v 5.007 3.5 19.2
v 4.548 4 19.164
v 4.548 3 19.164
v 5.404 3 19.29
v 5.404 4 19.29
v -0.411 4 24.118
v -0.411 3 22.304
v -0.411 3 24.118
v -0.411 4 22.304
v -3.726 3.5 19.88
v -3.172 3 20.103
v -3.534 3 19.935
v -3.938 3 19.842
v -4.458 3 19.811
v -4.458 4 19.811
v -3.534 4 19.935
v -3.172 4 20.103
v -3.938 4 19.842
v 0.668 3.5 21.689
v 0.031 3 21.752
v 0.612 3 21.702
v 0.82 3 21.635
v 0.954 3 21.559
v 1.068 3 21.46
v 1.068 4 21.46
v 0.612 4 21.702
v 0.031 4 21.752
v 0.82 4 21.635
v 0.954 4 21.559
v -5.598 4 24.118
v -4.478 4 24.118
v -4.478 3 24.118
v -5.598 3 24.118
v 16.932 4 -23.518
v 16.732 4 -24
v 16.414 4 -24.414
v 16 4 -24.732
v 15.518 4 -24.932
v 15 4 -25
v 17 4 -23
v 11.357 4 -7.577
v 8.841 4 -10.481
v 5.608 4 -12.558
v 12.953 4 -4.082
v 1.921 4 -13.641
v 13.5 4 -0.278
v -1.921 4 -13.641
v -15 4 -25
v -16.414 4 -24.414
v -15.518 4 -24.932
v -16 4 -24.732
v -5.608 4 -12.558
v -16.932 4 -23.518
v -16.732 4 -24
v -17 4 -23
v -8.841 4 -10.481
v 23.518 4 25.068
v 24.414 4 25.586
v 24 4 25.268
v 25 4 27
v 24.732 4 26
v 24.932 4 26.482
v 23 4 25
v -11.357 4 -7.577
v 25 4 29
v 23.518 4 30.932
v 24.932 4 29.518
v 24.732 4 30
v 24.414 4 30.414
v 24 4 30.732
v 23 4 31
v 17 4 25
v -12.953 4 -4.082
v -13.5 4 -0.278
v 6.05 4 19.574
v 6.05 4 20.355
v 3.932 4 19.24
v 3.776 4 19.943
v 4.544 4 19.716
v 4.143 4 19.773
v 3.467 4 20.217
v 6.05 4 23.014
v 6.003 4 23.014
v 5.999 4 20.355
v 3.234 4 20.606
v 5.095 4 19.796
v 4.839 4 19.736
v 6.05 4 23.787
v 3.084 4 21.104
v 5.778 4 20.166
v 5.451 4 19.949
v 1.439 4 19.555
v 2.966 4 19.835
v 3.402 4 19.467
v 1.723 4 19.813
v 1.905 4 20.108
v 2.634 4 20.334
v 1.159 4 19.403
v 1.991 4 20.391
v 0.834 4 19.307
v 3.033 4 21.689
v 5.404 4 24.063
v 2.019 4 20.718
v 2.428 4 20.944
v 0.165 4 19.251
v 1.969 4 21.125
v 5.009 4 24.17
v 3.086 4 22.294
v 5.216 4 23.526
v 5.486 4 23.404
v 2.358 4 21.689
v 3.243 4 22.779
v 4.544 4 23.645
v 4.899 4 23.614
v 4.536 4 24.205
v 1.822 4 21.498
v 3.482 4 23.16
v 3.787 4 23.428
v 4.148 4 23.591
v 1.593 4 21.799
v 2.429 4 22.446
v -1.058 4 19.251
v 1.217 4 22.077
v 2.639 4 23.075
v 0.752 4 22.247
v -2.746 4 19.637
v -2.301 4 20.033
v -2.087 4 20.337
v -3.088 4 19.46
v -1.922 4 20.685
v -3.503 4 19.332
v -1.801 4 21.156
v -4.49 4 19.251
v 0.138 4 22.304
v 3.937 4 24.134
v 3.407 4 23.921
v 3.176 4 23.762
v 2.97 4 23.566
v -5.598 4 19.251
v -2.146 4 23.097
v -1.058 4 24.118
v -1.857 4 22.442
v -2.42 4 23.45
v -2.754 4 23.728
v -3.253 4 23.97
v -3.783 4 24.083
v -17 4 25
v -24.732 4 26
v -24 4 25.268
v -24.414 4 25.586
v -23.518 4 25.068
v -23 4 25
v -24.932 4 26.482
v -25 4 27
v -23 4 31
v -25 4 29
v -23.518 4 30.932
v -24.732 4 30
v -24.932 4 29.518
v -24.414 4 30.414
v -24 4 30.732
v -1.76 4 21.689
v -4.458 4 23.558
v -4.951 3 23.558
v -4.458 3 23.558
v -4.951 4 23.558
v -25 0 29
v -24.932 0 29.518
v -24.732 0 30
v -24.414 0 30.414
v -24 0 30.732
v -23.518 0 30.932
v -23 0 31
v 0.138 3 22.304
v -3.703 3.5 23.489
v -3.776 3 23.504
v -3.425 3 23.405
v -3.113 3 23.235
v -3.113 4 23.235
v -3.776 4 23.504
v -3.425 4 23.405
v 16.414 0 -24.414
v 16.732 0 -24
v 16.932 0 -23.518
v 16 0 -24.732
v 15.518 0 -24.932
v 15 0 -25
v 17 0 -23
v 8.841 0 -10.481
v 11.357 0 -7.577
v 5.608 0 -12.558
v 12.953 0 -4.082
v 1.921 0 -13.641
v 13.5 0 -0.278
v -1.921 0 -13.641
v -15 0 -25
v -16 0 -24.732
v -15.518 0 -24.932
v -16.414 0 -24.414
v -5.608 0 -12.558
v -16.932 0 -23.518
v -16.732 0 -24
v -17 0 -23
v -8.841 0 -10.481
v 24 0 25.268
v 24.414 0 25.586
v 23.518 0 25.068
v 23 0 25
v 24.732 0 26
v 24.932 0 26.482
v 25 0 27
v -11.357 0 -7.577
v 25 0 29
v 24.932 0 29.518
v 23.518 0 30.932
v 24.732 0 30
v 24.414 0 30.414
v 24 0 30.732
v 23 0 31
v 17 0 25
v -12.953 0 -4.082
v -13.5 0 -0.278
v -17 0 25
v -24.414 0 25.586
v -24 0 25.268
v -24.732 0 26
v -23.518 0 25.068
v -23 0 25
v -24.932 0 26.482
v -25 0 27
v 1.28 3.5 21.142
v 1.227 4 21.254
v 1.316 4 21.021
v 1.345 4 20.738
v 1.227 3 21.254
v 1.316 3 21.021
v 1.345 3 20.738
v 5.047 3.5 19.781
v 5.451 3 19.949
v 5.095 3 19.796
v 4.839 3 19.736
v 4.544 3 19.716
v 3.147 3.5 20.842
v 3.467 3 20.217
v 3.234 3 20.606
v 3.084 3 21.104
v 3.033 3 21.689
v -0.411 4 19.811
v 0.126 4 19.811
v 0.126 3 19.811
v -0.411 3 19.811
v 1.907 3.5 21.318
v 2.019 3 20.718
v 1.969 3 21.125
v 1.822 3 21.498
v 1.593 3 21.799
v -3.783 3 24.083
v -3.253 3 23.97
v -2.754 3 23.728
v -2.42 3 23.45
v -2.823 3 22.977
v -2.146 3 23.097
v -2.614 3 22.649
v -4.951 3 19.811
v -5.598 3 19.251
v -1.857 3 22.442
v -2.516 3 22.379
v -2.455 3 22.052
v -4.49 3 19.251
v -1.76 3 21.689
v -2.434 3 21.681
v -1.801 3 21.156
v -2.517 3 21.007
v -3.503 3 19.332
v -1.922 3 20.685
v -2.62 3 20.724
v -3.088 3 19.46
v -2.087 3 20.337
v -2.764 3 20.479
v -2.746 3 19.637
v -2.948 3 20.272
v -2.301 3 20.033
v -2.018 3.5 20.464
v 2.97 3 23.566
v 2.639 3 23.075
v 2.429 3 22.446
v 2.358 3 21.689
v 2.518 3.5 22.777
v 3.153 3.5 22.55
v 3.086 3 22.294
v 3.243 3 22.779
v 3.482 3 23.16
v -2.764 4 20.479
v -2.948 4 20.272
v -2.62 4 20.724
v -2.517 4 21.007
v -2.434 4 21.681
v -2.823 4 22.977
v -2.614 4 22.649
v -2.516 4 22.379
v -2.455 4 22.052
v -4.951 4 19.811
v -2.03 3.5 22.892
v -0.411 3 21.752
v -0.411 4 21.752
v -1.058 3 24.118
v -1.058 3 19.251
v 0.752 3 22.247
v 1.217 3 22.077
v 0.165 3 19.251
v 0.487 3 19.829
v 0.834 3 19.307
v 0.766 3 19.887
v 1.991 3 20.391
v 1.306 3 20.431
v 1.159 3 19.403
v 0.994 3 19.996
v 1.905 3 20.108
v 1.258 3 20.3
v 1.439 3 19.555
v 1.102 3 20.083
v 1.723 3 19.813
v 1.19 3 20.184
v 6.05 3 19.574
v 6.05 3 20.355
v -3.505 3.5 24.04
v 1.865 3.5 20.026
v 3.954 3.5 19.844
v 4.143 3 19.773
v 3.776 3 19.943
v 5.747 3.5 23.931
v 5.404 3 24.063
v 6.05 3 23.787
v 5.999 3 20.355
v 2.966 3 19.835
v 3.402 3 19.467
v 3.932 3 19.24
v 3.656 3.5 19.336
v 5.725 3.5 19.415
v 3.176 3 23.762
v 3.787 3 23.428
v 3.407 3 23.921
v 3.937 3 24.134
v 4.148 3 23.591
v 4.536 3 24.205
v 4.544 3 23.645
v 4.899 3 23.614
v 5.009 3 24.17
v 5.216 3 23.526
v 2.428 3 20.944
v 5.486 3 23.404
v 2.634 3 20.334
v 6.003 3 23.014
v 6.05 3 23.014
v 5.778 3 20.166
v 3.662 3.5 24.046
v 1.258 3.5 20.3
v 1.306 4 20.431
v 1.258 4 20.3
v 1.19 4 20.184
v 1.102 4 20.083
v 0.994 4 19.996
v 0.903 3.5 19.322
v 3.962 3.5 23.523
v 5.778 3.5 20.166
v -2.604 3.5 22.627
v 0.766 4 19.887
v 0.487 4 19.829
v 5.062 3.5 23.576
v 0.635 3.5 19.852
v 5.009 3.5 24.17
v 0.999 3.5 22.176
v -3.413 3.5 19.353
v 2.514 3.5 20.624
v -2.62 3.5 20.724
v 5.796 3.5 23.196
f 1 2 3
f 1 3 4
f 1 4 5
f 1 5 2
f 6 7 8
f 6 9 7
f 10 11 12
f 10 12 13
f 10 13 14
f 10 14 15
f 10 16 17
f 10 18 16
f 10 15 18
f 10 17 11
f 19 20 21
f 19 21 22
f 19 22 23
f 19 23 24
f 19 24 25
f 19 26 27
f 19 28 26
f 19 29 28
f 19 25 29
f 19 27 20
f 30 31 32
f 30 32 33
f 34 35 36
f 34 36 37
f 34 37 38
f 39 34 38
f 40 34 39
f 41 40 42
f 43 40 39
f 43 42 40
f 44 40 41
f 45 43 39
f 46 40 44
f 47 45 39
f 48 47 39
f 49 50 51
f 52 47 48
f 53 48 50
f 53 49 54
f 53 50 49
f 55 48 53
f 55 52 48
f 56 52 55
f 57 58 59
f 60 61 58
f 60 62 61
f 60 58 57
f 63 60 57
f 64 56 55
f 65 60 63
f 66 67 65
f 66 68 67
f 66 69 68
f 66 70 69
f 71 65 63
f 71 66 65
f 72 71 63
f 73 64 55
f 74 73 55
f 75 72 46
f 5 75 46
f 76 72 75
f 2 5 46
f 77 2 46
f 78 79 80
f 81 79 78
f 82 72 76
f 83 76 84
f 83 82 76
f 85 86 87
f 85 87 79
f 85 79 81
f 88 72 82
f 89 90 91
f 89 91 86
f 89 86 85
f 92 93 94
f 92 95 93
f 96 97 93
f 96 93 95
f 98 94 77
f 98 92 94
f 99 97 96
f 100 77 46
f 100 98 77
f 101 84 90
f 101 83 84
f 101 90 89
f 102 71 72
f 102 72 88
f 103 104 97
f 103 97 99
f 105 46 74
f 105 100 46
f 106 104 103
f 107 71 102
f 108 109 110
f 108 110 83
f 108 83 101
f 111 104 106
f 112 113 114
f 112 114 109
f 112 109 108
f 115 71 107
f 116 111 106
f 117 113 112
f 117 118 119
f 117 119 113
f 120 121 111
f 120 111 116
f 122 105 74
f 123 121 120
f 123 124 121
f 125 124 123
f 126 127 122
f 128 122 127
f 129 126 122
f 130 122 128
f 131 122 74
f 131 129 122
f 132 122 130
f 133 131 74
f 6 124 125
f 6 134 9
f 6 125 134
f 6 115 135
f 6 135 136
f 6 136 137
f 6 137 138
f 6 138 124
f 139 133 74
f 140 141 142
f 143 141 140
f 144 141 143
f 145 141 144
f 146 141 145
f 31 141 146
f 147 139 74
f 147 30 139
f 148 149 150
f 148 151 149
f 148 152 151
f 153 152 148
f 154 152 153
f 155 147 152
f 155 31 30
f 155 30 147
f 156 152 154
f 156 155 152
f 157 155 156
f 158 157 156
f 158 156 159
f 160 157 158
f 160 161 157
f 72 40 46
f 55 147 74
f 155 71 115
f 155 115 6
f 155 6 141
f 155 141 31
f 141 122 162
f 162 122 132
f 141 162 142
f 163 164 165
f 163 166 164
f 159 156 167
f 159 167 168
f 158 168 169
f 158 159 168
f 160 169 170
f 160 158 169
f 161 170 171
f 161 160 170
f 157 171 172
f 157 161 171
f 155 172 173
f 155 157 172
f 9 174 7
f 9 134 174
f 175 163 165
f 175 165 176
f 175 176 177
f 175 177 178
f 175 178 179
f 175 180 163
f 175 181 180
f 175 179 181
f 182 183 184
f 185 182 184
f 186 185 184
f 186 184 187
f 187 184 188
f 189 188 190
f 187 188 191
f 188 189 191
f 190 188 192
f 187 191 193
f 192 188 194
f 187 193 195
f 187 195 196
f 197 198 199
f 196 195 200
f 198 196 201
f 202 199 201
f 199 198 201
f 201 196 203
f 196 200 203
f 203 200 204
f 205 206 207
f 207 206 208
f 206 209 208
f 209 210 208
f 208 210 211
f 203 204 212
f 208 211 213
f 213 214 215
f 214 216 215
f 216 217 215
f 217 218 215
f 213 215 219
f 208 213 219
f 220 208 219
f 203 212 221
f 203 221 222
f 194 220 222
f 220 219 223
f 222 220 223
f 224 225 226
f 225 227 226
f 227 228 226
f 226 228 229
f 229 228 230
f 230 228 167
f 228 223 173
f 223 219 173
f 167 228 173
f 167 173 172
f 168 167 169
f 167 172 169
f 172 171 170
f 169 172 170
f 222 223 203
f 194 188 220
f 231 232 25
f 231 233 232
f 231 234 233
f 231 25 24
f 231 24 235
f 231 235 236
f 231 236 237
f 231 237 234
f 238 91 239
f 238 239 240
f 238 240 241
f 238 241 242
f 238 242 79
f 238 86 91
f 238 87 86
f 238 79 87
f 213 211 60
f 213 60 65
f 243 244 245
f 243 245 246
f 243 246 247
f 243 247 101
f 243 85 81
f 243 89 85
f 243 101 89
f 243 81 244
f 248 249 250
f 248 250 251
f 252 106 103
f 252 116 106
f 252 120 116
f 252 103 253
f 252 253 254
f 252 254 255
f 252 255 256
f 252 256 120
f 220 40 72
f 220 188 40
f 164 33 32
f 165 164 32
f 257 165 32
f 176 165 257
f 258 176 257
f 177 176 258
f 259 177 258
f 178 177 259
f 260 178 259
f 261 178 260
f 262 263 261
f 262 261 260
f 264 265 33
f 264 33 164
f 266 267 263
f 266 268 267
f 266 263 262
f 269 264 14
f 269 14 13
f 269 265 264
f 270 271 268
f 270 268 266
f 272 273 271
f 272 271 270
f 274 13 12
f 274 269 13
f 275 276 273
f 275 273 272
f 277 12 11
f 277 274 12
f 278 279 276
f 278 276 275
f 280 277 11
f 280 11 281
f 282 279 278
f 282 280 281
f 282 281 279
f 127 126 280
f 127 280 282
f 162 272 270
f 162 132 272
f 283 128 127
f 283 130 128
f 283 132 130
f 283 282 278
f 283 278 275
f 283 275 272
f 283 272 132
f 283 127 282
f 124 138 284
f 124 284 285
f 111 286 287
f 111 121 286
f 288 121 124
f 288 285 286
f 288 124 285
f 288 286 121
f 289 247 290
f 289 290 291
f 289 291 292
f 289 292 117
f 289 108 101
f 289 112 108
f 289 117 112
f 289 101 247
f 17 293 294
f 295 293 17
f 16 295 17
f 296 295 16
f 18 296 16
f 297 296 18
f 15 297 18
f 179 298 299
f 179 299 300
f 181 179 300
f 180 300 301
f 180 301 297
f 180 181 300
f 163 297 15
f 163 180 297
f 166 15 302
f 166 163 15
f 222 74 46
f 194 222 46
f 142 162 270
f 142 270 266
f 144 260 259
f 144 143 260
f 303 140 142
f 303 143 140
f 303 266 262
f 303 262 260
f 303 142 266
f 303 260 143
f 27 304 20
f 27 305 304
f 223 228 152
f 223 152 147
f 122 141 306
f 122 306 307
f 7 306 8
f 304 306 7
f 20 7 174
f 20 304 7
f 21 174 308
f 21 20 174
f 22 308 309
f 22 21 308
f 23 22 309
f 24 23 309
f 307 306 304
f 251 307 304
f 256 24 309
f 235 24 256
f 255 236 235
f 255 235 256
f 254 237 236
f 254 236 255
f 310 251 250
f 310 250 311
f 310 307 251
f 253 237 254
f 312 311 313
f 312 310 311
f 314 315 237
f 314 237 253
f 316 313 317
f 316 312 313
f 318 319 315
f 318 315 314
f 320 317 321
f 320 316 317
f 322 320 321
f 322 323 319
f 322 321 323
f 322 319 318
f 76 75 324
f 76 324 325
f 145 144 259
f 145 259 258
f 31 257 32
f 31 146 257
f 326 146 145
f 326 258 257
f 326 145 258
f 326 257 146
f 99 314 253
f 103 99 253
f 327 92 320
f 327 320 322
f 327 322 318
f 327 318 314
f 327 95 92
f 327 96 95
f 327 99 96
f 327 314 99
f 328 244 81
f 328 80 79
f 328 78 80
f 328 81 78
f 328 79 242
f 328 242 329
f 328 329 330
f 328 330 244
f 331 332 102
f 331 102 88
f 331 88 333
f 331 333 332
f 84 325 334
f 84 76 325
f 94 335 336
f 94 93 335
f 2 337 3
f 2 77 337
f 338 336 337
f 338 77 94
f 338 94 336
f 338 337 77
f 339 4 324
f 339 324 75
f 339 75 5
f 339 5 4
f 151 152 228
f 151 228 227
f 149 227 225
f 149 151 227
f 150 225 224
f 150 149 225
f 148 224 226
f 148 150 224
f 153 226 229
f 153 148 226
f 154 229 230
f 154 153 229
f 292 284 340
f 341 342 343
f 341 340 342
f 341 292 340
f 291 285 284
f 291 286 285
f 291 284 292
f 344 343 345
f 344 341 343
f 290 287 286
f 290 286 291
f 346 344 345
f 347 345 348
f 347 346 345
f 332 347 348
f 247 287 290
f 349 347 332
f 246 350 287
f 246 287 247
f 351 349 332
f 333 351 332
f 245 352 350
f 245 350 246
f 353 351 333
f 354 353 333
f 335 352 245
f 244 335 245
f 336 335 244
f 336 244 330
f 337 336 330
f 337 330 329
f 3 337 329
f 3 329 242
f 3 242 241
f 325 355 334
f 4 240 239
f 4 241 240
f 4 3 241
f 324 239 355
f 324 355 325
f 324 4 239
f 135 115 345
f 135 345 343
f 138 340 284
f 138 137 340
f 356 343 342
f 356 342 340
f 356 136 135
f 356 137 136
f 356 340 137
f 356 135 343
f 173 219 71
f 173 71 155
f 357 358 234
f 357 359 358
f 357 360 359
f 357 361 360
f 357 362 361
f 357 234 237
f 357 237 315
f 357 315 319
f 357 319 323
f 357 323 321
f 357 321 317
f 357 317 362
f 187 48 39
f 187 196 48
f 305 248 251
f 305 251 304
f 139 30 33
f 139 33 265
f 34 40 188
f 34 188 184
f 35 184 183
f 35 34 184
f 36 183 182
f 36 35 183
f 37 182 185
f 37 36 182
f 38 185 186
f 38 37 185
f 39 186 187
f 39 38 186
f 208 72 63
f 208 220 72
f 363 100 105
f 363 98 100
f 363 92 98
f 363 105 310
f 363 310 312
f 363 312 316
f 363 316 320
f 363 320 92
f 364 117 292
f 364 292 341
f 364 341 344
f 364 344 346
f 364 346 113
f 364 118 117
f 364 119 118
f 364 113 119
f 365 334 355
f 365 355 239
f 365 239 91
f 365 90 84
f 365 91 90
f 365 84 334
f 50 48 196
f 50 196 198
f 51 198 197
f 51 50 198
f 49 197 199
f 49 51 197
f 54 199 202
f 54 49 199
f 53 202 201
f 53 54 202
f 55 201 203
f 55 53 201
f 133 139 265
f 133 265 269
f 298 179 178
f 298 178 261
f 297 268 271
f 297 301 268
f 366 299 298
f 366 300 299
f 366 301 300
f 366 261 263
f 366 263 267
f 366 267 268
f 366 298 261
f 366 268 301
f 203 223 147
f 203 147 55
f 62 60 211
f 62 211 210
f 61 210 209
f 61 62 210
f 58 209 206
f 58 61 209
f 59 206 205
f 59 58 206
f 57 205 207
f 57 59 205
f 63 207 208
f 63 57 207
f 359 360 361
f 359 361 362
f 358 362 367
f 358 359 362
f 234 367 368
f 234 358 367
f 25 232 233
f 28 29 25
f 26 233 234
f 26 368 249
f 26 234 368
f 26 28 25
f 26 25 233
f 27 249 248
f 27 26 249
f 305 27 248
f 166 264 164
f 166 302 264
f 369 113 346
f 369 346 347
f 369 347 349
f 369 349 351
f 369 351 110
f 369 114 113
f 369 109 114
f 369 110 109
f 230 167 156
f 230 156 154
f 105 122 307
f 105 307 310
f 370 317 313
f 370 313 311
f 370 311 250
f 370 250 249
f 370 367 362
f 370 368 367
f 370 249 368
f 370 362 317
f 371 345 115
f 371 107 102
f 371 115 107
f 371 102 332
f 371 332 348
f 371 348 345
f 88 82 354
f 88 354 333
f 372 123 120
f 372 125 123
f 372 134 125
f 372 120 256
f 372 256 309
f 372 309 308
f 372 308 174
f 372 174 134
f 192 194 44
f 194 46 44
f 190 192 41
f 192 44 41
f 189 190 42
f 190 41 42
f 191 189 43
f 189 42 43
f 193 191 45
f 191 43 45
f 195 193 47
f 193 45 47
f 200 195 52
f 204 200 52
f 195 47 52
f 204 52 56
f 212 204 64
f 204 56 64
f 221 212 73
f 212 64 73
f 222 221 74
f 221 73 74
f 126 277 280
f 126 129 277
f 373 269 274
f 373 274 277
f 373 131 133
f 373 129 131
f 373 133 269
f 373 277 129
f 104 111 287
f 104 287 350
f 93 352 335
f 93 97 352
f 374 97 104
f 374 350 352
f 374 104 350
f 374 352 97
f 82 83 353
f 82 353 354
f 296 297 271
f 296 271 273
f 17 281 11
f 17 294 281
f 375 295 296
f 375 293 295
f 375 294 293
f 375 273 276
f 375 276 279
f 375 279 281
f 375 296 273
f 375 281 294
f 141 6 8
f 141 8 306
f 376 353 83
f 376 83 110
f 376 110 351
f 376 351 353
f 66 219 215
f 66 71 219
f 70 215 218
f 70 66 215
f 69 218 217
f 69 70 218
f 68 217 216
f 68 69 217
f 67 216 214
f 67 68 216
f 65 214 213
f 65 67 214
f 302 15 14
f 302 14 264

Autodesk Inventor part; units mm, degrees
ref_plane "YZ Plane" through (0, 0, 0) normal (1, 0, 0) x (0, 1, 0)
ref_plane "XZ Plane" through (0, 0, 0) normal (0, 1, 0) x (-1, 0, 0)
ref_plane "XY Plane" through (0, 0, 0) normal (0, 0, 1) x (1, 0, 0)
sketch "Sketch1" plane through (0, 0, 0) normal (0, 1, 0) x (-1, 0, 0)
  line L0 (-17, 25) -> (17, 25)
  line L1 (17, 25) -> (17, -25)
  line L2 (17, -25) -> (-17, -25)
  line L3 (-17, -25) -> (-17, 25)
  line L4 (-17, 25) -> (17, -25) construction
  line L5 (17, 25) -> (-17, -25) construction
  line L6 (9, -17) -> (9, 17)
  line L7 (9, 17) -> (-9, 17)
  line L8 (-9, 17) -> (-9, -17)
  line L9 (-9, -17) -> (9, -17)
  line L10 (-25, 31) -> (25, 31)
  line L11 (25, 31) -> (25, 25)
  line L12 (25, 25) -> (-25, 25)
  line L13 (-25, 25) -> (-25, 31)
  line L14 (-25, 31) -> (25, 25) construction
  line L15 (25, 31) -> (-25, 25) construction
  point P0 (0, 0)
  point P1 (0, 28)
  point P2 (0, 25)
  dimension "d0" = 34
  dimension "d1" = 50
  dimension "d2" = 8
  dimension "d3" = 50
  dimension "d4" = 6
extrude "Extrusion1" add sketch "Sketch1" along normal blind 4 contours L12 L13 L10 L11 L0 | L0 L1 L2 L3 | L9 L8 L7 L6
sketch "Sketch2" plane through (0, 4, 0) normal (0, 1, 0) x (1, 0, 0)
  line L0 (25, -25) -> (17, -25) projected
  line L1 (17, -25) -> (17, 25) projected
  line L2 (17, 25) -> (-17, 25) projected
  line L3 (-17, 25) -> (-17, -25) projected
  line L4 (-17, -25) -> (-25, -25) projected
  line L5 (-25, -25) -> (-25, -31) projected
  line L6 (-25, -31) -> (25, -31) projected
  line L7 (25, -31) -> (25, -25) projected
  line L8 (13.5, 17) -> (-13.5, 17)
  line L9 (-13.5, 17) -> (-13.5, -17)
  line L10 (-13.5, -17) -> (13.5, -17)
  line L11 (13.5, -17) -> (13.5, 17)
  line L12 (13.5, 17) -> (-13.5, -17) construction
  line L13 (-13.5, 17) -> (13.5, -17) construction
  circle A0 centre (0, 0.2783) radius 13.5
  line L14 (-13.5, 0.2783) -> (13.5, 0.2783)
  point P0 (-1.4697, 0.3)
  point P1 (1.4697, 0.3)
  point P2 (13.5, 0)
  point P3 (-13.5, 0)
  dimension "d7" = 27
  dimension "d8" = 34
extrude "Extrusion2" cut sketch "Sketch2" against normal through all contours L14 A0 picked at (2.5563, 3.9817)
sketch "Sketch3" plane through (0, 4, 0) normal (0, 1, 0) x (1, 0, 0)
  line L0 (-6.091, -19.1641) -> (19.1348, -19.1641) construction
  line L1 (19.1348, -19.1641) -> (19.1348, -24.3512) construction
  line L2 (19.1348, -24.3512) -> (-6.091, -24.3512) construction
  line L3 (-6.091, -24.3512) -> (-6.091, -19.1641) construction
  spline S0 degree 2 poles (-1.7599, -21.6886) (-1.7599, -22.3553) (-2.3003, -23.4282) (-2.7539, -23.728) knots 0 0 0 1 2 2 2
  spline S1 degree 2 poles (-2.7539, -23.728) (-3.1247, -23.9607) (-3.886, -24.1185) (-4.4777, -24.1185) knots 0 0 0 1 2 2 2
  line L4 (-4.4777, -24.1185) -> (-5.598, -24.1185)
  line L5 (-5.598, -24.1185) -> (-5.598, -19.2508)
  line L6 (-5.598, -19.2508) -> (-4.4895, -19.2508)
  spline S2 degree 2 poles (-4.4895, -19.2508) (-3.8032, -19.2508) (-3.0221, -19.456) (-2.746, -19.6374) knots 0 0 0 1 2 2 2
  spline S3 degree 2 poles (-2.746, -19.6374) (-2.2766, -19.949) (-1.7599, -20.9786) (-1.7599, -21.6886) knots 0 0 0 1 2 2 2
  spline S4 degree 2 poles (-2.4344, -21.6807) (-2.4344, -21.1206) (-2.8052, -20.3277) (-3.172, -20.1029) knots 0 0 0 1 2 2 2
  spline S5 degree 2 poles (-3.172, -20.1029) (-3.4324, -19.949) (-4.0201, -19.811) (-4.458, -19.811) knots 0 0 0 1 2 2 2
  line L7 (-4.458, -19.811) -> (-4.9511, -19.811)
  line L8 (-4.9511, -19.811) -> (-4.9511, -23.5584)
  line L9 (-4.9511, -23.5584) -> (-4.458, -23.5584)
  spline S6 degree 2 poles (-4.458, -23.5584) (-4.028, -23.5584) (-3.3772, -23.4203) (-3.1129, -23.2349) knots 0 0 0 1 2 2 2
  spline S7 degree 2 poles (-3.1129, -23.2349) (-2.7736, -23.0061) (-2.4344, -22.2488) (-2.4344, -21.6807) knots 0 0 0 1 2 2 2
  spline S8 degree 2 poles (2.0191, -20.7182) (2.0191, -21.0338) (1.7942, -21.6018) (1.5931, -21.7991) knots 0 0 0 1 2 2 2
  spline S9 degree 2 poles (1.5931, -21.7991) (1.3406, -22.0476) (0.6582, -22.304) (0.1375, -22.304) knots 0 0 0 1 2 2 2
  line L10 (0.1375, -22.304) -> (-0.4108, -22.304)
  line L11 (-0.4108, -22.304) -> (-0.4108, -24.1185)
  line L12 (-0.4108, -24.1185) -> (-1.0577, -24.1185)
  line L13 (-1.0577, -24.1185) -> (-1.0577, -19.2508)
  line L14 (-1.0577, -19.2508) -> (0.1651, -19.2508)
  spline S10 degree 2 poles (0.1651, -19.2508) (0.599, -19.2508) (1.2065, -19.3929) (1.4392, -19.5546) knots 0 0 0 1 2 2 2
  spline S11 degree 2 poles (1.4392, -19.5546) (1.7114, -19.74) (2.0191, -20.3119) (2.0191, -20.7182) knots 0 0 0 1 2 2 2
  spline S12 degree 2 poles (1.3446, -20.738) (1.3446, -20.4855) (1.171, -20.1147) (0.9935, -19.9964) knots 0 0 0 1 2 2 2
  spline S13 degree 2 poles (0.9935, -19.9964) (0.8396, -19.8938) (0.4294, -19.811) (0.1257, -19.811) knots 0 0 0 1 2 2 2
  line L15 (0.1257, -19.811) -> (-0.4108, -19.811)
  line L16 (-0.4108, -19.811) -> (-0.4108, -21.7517)
  line L17 (-0.4108, -21.7517) -> (0.031, -21.7517)
  spline S14 degree 2 poles (0.031, -21.7517) (0.4255, -21.7517) (0.9106, -21.6255) (1.0684, -21.4598) knots 0 0 0 1 2 2 2
  spline S15 degree 2 poles (1.0684, -21.4598) (1.2144, -21.3139) (1.3446, -20.9707) (1.3446, -20.738) knots 0 0 0 1 2 2 2
  spline S16 degree 2 poles (4.5357, -24.2053) (4.0624, -24.2053) (3.2616, -23.8858) (2.9697, -23.5663) knots 0 0 0 1 2 2 2
  spline S17 degree 2 poles (2.9697, -23.5663) (2.6778, -23.2507) (2.3583, -22.304) (2.3583, -21.6886) knots 0 0 0 1 2 2 2
  spline S18 degree 2 poles (2.3583, -21.6886) (2.3583, -21.0772) (2.6699, -20.1699) (2.9658, -19.8346) knots 0 0 0 1 2 2 2
  spline S19 degree 2 poles (2.9658, -19.8346) (3.2577, -19.5072) (4.0545, -19.1641) (4.5476, -19.1641) knots 0 0 0 1 2 2 2
  spline S20 degree 2 poles (4.5476, -19.1641) (4.7921, -19.1641) (5.2221, -19.2351) (5.4036, -19.2903) knots 0 0 0 1 2 2 2
  spline S21 degree 2 poles (5.4036, -19.2903) (5.5613, -19.3416) (5.8888, -19.4875) (6.0505, -19.5743) knots 0 0 0 1 2 2 2
  line L18 (6.0505, -19.5743) -> (6.0505, -20.3553)
  line L19 (6.0505, -20.3553) -> (5.9992, -20.3553)
  spline S22 degree 2 poles (5.9992, -20.3553) (5.9124, -20.2764) (5.6442, -20.0555) (5.4509, -19.949) knots 0 0 0 1 2 2 2
  spline S23 degree 2 poles (5.4509, -19.949) (5.2655, -19.8465) (4.8276, -19.7163) (4.5436, -19.7163) knots 0 0 0 1 2 2 2
  spline S24 degree 2 poles (4.5436, -19.7163) (4.232, -19.7163) (3.6758, -19.9727) (3.4668, -20.2173) knots 0 0 0 1 2 2 2
  spline S25 degree 2 poles (3.4668, -20.2173) (3.2616, -20.4658) (3.0328, -21.2192) (3.0328, -21.6886) knots 0 0 0 1 2 2 2
  spline S26 degree 2 poles (3.0328, -21.6886) (3.0328, -22.1896) (3.2735, -22.9114) (3.4825, -23.16) knots 0 0 0 1 2 2 2
  spline S27 degree 2 poles (3.4825, -23.16) (3.6877, -23.4006) (4.236, -23.6451) (4.5436, -23.6451) knots 0 0 0 1 2 2 2
  spline S28 degree 2 poles (4.5436, -23.6451) (4.8237, -23.6451) (5.301, -23.5071) (5.4864, -23.4045) knots 0 0 0 1 2 2 2
  spline S29 degree 2 poles (5.4864, -23.4045) (5.6639, -23.302) (5.9282, -23.089) (6.0031, -23.014) knots 0 0 0 1 2 2 2
  line L20 (6.0031, -23.014) -> (6.0505, -23.014)
  line L21 (6.0505, -23.014) -> (6.0505, -23.7872)
  spline S30 degree 2 poles (6.0505, -23.7872) (5.8888, -23.8621) (5.6047, -24.0002) (5.4036, -24.0633) knots 0 0 0 1 2 2 2
  spline S31 degree 2 poles (5.4036, -24.0633) (5.1906, -24.1343) (4.8276, -24.2053) (4.5357, -24.2053) knots 0 0 0 1 2 2 2
  point P0 (0, 0)
extrude "Extrusion3" cut sketch "Sketch3" against normal blind 1
fillet "Fillet1" radius 2 6 edges at (25, 2, 31) (25, 2, 25) (-25, 2, 31) (-25, 2, 25) (-17, 2, -25) (17, 2, -25)
properties part number "00_Slider_Mask_DPC"
